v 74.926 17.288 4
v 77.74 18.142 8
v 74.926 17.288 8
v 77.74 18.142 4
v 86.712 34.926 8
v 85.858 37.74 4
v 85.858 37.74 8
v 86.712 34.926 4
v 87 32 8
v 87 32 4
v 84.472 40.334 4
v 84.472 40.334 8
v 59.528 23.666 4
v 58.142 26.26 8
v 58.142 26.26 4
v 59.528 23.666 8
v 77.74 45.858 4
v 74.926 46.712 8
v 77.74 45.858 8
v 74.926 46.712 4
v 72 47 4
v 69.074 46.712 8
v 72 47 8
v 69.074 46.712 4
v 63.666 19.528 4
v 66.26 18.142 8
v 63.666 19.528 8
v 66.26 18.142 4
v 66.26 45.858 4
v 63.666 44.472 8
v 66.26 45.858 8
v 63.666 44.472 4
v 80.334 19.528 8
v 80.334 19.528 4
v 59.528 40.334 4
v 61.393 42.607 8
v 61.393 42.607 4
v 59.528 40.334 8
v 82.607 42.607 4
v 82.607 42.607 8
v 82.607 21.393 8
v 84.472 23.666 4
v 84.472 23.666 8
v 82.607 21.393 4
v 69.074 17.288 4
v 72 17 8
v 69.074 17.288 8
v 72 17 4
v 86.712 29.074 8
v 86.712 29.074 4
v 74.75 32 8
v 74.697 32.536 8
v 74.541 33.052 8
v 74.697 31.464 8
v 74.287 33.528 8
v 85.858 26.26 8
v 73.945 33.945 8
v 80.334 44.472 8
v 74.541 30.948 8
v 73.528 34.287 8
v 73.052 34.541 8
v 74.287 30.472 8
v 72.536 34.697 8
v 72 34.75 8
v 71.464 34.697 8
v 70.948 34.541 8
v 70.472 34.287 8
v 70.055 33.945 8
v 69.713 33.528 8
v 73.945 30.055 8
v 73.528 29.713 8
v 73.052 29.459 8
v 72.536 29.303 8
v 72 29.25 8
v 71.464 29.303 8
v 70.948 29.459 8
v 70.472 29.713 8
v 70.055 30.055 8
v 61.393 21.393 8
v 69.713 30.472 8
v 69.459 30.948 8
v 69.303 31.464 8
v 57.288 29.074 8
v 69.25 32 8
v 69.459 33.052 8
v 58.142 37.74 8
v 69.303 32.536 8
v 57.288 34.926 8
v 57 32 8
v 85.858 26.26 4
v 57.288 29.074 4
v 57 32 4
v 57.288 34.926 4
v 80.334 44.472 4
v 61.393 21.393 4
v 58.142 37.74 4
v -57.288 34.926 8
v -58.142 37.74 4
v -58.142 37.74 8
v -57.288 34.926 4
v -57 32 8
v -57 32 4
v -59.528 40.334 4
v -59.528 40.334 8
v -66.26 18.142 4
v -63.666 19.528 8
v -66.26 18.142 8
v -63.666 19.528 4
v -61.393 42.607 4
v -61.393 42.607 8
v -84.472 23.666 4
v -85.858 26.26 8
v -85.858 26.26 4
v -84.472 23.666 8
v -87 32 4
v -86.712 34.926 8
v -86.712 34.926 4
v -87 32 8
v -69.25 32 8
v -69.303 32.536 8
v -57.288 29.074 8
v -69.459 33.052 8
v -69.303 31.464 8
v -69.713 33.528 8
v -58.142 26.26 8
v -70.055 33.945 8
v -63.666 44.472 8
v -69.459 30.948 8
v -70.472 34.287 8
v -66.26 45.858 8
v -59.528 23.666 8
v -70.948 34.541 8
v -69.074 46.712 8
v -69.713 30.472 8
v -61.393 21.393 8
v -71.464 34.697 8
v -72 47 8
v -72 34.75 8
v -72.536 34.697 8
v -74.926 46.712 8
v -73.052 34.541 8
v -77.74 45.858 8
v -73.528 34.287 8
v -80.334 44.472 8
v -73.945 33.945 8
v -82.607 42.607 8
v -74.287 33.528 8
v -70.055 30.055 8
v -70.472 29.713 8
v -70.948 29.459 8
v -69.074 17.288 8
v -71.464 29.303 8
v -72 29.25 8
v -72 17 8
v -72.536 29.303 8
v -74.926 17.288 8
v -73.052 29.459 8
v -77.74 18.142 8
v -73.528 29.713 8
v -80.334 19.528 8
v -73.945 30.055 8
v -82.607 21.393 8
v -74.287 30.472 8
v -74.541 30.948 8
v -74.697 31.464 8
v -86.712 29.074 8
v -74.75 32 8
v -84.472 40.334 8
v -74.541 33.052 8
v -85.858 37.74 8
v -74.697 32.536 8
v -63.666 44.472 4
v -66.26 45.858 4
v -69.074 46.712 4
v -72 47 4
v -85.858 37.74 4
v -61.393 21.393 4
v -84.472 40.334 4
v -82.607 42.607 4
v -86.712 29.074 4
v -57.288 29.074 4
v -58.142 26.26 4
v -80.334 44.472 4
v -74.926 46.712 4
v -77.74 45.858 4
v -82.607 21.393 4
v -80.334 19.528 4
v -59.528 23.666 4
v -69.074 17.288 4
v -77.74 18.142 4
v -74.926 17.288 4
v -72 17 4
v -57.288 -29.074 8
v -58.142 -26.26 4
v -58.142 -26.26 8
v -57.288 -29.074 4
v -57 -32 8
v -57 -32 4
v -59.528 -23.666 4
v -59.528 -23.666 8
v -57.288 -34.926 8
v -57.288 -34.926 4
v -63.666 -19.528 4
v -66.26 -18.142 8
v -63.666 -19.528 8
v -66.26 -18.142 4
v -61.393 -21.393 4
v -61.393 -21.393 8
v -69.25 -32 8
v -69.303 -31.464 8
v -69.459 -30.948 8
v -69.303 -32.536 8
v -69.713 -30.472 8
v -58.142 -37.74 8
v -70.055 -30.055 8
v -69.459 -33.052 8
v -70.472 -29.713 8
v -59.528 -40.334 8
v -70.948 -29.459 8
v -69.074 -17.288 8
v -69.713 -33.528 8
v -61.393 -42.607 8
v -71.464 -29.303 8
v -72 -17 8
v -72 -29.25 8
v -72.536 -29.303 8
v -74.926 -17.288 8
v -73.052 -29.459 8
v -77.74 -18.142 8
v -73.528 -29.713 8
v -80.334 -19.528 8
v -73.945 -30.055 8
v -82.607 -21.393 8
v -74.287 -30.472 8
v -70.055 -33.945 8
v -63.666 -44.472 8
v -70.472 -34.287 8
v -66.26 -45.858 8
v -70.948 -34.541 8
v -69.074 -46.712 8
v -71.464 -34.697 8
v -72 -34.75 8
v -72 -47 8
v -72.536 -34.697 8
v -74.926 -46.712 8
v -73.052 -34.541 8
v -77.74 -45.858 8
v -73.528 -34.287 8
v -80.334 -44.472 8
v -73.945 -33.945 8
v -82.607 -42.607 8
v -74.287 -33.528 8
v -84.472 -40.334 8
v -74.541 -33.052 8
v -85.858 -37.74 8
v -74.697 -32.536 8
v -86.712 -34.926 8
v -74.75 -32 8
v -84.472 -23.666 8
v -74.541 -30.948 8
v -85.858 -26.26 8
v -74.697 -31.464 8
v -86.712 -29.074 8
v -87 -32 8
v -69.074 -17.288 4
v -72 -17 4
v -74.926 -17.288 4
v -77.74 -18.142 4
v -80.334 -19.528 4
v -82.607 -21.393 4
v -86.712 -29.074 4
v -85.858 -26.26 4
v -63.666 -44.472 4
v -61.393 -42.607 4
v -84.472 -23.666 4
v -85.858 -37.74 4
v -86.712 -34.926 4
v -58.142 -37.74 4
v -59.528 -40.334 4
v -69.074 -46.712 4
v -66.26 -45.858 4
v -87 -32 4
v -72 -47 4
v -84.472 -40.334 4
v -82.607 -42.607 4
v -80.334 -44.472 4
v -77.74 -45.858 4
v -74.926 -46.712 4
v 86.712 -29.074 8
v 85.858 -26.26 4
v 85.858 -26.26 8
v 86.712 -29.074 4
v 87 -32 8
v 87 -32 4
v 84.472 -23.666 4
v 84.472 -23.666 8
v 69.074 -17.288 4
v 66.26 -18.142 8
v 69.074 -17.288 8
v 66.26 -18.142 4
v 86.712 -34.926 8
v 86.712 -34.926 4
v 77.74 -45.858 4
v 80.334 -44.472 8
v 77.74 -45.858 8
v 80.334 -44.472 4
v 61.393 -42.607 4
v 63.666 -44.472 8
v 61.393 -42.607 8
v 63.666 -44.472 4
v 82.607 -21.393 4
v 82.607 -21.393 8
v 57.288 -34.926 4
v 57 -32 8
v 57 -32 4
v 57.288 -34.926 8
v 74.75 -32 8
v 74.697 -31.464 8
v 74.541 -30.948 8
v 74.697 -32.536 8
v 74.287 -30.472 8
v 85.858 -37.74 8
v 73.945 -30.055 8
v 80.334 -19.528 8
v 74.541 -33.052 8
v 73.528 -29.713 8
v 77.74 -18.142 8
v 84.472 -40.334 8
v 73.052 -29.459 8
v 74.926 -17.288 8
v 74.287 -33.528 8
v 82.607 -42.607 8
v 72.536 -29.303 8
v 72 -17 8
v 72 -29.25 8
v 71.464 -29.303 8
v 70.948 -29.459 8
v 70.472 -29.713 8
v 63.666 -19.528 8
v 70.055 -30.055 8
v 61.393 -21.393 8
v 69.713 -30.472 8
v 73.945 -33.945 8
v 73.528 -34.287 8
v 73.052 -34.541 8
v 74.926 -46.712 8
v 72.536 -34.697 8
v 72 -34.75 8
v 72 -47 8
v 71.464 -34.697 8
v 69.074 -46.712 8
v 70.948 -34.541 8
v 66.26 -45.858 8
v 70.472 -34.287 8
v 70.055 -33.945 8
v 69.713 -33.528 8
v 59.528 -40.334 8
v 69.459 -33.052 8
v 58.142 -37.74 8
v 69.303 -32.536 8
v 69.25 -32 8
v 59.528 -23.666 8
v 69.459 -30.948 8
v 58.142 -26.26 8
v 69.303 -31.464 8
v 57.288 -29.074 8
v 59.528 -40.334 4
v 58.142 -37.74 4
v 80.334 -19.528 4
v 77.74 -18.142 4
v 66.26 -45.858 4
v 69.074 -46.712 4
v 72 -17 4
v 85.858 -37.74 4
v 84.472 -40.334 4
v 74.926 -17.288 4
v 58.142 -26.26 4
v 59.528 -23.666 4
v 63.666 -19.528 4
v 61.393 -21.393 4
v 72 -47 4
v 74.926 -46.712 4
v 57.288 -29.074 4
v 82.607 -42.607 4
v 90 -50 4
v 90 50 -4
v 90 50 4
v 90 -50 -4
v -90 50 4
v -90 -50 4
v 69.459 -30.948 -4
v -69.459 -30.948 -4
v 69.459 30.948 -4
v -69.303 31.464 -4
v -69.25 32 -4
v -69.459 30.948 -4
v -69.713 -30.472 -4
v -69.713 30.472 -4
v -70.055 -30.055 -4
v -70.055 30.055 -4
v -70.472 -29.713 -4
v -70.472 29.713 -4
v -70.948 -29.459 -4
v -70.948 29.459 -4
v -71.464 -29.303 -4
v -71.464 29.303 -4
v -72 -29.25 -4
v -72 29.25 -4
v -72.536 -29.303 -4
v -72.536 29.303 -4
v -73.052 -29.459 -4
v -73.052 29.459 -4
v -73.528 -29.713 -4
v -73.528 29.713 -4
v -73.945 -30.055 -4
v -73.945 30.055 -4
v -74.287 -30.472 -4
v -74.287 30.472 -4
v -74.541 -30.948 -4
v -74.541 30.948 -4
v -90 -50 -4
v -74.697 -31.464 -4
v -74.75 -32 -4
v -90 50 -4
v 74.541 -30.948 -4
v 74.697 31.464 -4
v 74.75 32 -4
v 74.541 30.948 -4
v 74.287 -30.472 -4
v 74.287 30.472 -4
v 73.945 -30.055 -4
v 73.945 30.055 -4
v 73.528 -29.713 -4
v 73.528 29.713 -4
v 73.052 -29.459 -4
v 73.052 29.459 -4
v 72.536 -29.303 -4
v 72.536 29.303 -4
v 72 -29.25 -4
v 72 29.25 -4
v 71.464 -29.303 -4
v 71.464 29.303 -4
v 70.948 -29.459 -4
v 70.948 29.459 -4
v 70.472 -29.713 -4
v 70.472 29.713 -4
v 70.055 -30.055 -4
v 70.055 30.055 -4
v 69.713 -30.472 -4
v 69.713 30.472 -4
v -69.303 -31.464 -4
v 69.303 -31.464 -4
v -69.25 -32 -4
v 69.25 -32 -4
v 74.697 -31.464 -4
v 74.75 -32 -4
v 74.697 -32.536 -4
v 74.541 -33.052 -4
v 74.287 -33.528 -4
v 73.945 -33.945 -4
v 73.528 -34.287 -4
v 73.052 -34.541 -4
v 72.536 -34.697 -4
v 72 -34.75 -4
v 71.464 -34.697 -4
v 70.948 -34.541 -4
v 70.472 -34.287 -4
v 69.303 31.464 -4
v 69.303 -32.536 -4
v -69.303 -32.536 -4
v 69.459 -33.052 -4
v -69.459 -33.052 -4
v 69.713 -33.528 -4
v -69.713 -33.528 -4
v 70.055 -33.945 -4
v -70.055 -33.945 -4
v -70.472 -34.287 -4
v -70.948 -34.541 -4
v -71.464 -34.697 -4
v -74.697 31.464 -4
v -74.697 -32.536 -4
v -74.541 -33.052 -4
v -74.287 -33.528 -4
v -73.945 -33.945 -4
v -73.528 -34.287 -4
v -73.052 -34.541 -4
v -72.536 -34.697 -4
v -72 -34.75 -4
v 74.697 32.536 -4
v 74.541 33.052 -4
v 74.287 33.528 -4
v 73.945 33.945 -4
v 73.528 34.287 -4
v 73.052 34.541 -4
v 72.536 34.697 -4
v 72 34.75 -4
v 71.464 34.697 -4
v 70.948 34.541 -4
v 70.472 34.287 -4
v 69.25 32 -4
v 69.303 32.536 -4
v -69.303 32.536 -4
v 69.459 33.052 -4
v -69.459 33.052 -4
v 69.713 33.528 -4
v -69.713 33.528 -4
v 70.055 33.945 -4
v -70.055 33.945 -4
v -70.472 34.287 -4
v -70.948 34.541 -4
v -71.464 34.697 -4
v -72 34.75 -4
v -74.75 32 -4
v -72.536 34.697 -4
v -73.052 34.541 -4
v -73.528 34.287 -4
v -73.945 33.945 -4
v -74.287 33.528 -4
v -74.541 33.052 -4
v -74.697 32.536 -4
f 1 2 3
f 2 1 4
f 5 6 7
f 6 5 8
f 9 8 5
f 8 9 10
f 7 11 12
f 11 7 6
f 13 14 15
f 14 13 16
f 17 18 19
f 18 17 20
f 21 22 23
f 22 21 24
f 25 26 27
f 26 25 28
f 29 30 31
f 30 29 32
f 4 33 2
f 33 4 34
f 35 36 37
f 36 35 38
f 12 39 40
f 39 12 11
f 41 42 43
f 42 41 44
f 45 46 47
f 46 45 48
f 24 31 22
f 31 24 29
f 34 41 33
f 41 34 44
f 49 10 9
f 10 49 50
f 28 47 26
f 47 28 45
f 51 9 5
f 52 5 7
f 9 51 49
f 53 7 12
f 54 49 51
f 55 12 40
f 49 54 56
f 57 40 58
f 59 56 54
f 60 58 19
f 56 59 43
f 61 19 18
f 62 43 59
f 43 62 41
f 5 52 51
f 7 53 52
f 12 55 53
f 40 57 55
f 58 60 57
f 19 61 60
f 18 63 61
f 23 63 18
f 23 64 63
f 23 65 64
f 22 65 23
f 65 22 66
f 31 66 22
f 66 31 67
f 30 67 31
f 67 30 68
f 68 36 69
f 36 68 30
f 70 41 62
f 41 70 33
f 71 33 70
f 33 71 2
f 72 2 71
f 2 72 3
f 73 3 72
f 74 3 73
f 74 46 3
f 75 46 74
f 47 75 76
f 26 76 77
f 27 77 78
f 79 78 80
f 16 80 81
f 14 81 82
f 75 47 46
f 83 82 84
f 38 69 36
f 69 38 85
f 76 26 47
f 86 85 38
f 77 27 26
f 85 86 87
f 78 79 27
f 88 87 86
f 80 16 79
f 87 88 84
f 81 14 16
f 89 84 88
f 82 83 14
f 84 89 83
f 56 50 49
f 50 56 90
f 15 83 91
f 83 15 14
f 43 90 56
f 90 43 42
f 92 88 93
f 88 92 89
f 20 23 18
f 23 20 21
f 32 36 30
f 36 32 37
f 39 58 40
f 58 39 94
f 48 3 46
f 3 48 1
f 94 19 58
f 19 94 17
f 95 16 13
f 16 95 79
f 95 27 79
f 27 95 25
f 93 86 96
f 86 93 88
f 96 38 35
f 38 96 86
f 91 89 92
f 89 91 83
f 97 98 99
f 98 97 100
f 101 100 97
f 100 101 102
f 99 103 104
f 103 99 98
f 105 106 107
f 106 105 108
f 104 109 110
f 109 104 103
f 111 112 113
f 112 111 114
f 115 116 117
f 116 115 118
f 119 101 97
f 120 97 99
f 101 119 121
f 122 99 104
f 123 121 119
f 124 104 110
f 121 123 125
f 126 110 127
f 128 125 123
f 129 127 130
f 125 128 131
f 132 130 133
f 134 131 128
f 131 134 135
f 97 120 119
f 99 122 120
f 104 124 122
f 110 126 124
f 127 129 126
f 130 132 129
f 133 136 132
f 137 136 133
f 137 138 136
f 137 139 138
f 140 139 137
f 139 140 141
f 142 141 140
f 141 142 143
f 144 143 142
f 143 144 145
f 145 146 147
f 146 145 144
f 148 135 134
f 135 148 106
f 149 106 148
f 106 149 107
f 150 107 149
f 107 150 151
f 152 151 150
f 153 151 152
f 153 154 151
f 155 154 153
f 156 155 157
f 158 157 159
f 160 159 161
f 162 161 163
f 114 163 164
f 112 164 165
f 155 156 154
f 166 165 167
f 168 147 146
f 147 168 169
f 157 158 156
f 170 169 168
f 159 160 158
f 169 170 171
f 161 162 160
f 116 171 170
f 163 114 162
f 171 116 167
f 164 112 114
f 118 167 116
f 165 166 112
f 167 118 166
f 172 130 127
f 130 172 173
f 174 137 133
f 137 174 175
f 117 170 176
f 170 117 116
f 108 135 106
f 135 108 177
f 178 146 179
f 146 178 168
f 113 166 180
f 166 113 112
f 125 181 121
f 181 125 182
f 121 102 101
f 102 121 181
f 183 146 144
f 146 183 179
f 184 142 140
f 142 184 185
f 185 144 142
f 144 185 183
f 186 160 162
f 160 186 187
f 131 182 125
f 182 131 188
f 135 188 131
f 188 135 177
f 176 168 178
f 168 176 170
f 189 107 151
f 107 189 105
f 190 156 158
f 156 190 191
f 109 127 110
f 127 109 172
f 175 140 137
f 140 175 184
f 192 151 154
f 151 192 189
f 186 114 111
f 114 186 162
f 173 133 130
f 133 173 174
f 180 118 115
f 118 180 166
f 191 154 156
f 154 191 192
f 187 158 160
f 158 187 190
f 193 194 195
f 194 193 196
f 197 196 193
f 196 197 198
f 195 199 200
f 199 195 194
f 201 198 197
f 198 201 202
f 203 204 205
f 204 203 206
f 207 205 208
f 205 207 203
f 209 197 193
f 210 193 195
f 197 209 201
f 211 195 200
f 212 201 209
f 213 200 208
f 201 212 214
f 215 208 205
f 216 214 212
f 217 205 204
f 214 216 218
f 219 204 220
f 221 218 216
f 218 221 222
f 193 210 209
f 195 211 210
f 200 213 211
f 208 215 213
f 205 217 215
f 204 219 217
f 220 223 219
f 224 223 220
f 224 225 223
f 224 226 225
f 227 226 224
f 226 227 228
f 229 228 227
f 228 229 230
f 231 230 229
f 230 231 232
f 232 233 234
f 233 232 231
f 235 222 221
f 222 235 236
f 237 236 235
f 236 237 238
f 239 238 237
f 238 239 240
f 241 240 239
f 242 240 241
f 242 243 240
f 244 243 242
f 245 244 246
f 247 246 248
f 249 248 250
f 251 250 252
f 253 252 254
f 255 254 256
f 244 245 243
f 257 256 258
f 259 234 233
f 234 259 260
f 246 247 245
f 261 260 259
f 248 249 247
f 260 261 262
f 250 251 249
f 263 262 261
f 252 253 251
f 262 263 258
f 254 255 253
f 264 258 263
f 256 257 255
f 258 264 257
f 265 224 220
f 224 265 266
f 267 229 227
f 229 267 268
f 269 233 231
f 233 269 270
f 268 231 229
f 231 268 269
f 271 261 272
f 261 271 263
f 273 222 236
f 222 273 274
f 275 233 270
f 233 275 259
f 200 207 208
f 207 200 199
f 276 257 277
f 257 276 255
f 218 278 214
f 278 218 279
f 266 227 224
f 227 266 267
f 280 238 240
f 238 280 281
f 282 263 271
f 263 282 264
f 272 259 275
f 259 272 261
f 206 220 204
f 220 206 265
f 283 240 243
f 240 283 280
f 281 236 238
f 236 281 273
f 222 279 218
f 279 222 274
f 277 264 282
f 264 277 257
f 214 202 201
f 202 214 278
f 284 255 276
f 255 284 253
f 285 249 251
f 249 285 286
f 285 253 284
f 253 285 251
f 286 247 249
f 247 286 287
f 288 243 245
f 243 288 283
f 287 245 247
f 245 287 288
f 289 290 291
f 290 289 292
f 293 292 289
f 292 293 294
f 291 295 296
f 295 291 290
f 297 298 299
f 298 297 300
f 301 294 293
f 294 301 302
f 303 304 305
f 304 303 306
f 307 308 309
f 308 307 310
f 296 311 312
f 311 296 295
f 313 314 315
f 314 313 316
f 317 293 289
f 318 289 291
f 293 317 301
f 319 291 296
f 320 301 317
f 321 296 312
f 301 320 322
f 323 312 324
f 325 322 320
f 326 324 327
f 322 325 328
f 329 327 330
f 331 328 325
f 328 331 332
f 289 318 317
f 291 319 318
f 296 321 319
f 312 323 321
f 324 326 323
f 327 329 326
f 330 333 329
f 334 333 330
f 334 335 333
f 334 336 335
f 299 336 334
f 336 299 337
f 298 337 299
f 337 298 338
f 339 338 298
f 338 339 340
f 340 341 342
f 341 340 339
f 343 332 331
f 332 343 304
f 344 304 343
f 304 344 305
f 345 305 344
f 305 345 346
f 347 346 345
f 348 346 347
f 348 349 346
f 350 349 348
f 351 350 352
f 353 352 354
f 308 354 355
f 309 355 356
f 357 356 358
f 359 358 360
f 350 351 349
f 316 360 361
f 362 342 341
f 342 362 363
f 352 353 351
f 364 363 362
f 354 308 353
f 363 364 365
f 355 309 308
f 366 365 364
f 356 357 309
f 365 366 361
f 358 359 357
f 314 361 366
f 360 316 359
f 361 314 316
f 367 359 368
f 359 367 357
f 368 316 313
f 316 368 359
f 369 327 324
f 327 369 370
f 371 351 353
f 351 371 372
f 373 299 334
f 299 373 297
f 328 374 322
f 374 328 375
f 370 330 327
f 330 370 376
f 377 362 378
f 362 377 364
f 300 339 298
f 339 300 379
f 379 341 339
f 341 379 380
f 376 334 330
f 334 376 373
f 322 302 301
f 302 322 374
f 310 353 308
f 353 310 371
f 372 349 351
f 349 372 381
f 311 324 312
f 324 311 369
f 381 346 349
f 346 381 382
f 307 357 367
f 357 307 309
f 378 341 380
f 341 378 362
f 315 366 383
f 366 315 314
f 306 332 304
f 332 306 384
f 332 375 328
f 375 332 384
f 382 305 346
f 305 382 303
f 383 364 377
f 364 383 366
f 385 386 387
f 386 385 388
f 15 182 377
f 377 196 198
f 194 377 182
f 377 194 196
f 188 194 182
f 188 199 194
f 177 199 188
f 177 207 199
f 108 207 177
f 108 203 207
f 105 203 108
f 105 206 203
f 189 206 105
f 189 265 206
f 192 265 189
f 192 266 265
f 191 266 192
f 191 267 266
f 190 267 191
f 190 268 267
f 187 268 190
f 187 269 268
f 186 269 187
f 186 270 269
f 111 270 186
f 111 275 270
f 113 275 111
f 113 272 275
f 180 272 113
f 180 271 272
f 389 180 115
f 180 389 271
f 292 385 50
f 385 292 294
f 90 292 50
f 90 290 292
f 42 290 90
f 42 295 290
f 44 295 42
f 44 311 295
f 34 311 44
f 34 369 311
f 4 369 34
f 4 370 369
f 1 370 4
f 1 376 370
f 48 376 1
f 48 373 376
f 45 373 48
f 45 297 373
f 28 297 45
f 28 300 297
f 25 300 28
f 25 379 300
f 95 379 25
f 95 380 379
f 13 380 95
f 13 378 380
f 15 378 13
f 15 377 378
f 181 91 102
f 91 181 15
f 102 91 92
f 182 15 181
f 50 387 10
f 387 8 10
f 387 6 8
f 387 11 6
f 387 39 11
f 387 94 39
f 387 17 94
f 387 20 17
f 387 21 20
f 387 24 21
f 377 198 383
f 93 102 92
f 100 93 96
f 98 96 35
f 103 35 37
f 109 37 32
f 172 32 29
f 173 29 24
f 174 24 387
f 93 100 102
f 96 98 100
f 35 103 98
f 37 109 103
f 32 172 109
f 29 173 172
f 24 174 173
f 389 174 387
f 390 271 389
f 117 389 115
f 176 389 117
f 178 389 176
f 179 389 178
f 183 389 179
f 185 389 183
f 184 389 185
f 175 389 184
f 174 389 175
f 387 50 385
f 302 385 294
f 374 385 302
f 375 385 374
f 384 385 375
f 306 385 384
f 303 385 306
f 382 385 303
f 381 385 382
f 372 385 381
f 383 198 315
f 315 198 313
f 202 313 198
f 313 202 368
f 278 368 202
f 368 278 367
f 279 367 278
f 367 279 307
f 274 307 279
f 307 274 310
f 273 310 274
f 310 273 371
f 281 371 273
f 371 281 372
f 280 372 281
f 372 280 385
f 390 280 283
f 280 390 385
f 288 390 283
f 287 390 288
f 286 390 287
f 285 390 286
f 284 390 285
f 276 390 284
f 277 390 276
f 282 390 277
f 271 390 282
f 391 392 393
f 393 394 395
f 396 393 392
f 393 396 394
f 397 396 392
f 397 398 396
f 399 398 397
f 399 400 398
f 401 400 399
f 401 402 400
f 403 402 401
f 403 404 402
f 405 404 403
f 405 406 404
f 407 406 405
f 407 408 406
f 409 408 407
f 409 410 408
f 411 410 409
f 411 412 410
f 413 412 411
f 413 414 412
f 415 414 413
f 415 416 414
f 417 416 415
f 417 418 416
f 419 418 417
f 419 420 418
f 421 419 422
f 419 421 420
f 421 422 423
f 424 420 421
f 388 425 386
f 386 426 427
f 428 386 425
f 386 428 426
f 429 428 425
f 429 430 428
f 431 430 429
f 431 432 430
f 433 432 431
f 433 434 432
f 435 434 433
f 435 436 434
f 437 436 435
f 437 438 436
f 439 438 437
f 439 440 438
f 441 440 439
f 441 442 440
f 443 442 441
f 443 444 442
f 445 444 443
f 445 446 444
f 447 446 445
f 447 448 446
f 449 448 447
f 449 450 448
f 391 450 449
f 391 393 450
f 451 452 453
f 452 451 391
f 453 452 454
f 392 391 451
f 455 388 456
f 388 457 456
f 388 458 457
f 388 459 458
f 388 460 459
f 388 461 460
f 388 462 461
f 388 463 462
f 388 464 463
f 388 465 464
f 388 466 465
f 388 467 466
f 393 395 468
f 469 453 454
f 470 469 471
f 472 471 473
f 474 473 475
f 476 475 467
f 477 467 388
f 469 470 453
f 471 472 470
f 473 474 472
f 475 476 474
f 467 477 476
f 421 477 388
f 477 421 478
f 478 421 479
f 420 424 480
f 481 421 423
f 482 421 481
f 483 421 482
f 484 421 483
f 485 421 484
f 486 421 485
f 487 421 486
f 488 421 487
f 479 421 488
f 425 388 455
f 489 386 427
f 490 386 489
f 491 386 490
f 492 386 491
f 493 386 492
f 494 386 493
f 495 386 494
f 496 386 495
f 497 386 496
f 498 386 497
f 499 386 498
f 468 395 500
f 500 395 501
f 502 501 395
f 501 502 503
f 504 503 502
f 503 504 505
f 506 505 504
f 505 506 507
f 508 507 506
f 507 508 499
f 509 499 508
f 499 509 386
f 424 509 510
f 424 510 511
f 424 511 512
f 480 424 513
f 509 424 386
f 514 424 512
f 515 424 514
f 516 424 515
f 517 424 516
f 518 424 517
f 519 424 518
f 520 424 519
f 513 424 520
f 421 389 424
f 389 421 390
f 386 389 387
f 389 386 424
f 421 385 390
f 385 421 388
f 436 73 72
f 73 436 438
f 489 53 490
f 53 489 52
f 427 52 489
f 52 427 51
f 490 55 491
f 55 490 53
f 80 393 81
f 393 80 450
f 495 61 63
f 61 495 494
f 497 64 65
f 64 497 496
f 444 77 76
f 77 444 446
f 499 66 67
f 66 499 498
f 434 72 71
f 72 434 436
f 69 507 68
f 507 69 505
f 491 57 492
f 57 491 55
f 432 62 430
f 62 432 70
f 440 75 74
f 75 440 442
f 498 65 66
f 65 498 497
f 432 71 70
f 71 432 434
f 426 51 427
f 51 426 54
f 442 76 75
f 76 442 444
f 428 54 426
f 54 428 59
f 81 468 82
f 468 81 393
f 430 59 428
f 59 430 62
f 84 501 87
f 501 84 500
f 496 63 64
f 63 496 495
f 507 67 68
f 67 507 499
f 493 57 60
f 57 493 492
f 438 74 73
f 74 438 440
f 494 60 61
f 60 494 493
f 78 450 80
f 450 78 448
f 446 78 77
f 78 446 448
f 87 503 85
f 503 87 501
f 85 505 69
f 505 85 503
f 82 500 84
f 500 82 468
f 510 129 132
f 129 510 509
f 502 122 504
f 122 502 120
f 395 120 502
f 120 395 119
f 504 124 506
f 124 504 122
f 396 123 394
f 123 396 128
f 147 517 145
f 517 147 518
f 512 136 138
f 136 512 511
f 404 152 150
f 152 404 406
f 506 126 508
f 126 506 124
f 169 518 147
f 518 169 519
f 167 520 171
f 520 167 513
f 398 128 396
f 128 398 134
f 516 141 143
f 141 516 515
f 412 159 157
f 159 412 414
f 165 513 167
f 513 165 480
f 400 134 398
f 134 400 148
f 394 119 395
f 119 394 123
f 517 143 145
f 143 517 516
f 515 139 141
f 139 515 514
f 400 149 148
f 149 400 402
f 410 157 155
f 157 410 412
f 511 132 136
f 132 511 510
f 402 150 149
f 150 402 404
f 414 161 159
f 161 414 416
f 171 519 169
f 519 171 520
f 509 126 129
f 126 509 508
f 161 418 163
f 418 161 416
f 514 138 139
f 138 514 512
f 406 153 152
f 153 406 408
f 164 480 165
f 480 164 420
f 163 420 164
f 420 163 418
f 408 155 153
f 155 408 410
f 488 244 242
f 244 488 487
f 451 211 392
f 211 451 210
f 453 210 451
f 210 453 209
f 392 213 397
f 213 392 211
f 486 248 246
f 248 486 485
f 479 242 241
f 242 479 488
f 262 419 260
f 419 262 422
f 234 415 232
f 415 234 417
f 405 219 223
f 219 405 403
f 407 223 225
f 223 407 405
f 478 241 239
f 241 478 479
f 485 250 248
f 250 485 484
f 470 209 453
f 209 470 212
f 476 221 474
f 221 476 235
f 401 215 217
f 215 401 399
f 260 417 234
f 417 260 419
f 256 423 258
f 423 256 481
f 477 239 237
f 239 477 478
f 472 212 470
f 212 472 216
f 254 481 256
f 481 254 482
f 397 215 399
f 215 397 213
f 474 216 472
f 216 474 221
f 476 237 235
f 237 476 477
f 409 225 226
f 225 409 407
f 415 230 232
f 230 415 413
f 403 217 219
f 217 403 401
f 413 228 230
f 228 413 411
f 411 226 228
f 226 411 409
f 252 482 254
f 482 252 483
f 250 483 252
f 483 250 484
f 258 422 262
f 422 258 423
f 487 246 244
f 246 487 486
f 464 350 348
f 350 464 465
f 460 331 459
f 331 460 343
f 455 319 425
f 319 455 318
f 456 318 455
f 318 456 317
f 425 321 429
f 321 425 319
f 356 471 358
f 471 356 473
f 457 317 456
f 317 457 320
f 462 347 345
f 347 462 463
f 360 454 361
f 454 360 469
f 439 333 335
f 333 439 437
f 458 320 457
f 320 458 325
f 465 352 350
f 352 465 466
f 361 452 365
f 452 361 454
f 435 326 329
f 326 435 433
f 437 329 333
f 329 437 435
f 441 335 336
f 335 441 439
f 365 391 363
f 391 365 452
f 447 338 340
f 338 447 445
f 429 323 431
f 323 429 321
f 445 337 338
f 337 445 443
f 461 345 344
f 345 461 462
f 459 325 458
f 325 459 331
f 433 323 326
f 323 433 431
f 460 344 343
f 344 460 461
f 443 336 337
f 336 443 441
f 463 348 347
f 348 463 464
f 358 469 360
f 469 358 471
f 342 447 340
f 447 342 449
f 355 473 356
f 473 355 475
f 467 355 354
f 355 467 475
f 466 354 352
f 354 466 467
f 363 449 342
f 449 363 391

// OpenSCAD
$fn = 32;

// ----------------------------------------------------------------------
// Anchor pads 180 x 100 x 12
// four corner bosses with anchor holes
// ----------------------------------------------------------------------

// --- parameters (mm) ---
plate = [180, 100, 8];  // base plate size (x, y, z)
seat_tol = 0.05;        // tolerance at the seating features
free_tol = 0.3;         // general tolerance on the free sizes
pads = 4;               // boss count, one per corner
edge = 18;              // boss centre offset from the plate edge
boss_d = 30;            // boss diameter
boss_h = 4;             // boss height above the base plate
hole_d = 5.5;           // hole diameter

// --- derived feature positions (mm) ---
height = plate[2] + boss_h;      // = 12   overall height of the part
corner_x = plate[0] / 2 - edge;  // = 72   boss centre X
corner_y = plate[1] / 2 - edge;  // = 32   boss centre Y
feature_centers = [
  [corner_x, corner_y],
  [-corner_x, corner_y],
  [-corner_x, -corner_y],
  [corner_x, -corner_y]
];   // boss centres, anchor holes are drilled there

// base plate, four bosses standing on it, anchor holes all the way through
difference() {
  union() {
    cube(plate, center = true);
    for (centre = feature_centers)
      translate([centre[0], centre[1], plate[2] / 2 - 1])
        cylinder(d = boss_d, h = boss_h + 1);
  }
  for (centre = feature_centers)
    translate([centre[0], centre[1], -height])
      cylinder(d = hole_d, h = 2 * height + 2);  // through boss and plate
}
